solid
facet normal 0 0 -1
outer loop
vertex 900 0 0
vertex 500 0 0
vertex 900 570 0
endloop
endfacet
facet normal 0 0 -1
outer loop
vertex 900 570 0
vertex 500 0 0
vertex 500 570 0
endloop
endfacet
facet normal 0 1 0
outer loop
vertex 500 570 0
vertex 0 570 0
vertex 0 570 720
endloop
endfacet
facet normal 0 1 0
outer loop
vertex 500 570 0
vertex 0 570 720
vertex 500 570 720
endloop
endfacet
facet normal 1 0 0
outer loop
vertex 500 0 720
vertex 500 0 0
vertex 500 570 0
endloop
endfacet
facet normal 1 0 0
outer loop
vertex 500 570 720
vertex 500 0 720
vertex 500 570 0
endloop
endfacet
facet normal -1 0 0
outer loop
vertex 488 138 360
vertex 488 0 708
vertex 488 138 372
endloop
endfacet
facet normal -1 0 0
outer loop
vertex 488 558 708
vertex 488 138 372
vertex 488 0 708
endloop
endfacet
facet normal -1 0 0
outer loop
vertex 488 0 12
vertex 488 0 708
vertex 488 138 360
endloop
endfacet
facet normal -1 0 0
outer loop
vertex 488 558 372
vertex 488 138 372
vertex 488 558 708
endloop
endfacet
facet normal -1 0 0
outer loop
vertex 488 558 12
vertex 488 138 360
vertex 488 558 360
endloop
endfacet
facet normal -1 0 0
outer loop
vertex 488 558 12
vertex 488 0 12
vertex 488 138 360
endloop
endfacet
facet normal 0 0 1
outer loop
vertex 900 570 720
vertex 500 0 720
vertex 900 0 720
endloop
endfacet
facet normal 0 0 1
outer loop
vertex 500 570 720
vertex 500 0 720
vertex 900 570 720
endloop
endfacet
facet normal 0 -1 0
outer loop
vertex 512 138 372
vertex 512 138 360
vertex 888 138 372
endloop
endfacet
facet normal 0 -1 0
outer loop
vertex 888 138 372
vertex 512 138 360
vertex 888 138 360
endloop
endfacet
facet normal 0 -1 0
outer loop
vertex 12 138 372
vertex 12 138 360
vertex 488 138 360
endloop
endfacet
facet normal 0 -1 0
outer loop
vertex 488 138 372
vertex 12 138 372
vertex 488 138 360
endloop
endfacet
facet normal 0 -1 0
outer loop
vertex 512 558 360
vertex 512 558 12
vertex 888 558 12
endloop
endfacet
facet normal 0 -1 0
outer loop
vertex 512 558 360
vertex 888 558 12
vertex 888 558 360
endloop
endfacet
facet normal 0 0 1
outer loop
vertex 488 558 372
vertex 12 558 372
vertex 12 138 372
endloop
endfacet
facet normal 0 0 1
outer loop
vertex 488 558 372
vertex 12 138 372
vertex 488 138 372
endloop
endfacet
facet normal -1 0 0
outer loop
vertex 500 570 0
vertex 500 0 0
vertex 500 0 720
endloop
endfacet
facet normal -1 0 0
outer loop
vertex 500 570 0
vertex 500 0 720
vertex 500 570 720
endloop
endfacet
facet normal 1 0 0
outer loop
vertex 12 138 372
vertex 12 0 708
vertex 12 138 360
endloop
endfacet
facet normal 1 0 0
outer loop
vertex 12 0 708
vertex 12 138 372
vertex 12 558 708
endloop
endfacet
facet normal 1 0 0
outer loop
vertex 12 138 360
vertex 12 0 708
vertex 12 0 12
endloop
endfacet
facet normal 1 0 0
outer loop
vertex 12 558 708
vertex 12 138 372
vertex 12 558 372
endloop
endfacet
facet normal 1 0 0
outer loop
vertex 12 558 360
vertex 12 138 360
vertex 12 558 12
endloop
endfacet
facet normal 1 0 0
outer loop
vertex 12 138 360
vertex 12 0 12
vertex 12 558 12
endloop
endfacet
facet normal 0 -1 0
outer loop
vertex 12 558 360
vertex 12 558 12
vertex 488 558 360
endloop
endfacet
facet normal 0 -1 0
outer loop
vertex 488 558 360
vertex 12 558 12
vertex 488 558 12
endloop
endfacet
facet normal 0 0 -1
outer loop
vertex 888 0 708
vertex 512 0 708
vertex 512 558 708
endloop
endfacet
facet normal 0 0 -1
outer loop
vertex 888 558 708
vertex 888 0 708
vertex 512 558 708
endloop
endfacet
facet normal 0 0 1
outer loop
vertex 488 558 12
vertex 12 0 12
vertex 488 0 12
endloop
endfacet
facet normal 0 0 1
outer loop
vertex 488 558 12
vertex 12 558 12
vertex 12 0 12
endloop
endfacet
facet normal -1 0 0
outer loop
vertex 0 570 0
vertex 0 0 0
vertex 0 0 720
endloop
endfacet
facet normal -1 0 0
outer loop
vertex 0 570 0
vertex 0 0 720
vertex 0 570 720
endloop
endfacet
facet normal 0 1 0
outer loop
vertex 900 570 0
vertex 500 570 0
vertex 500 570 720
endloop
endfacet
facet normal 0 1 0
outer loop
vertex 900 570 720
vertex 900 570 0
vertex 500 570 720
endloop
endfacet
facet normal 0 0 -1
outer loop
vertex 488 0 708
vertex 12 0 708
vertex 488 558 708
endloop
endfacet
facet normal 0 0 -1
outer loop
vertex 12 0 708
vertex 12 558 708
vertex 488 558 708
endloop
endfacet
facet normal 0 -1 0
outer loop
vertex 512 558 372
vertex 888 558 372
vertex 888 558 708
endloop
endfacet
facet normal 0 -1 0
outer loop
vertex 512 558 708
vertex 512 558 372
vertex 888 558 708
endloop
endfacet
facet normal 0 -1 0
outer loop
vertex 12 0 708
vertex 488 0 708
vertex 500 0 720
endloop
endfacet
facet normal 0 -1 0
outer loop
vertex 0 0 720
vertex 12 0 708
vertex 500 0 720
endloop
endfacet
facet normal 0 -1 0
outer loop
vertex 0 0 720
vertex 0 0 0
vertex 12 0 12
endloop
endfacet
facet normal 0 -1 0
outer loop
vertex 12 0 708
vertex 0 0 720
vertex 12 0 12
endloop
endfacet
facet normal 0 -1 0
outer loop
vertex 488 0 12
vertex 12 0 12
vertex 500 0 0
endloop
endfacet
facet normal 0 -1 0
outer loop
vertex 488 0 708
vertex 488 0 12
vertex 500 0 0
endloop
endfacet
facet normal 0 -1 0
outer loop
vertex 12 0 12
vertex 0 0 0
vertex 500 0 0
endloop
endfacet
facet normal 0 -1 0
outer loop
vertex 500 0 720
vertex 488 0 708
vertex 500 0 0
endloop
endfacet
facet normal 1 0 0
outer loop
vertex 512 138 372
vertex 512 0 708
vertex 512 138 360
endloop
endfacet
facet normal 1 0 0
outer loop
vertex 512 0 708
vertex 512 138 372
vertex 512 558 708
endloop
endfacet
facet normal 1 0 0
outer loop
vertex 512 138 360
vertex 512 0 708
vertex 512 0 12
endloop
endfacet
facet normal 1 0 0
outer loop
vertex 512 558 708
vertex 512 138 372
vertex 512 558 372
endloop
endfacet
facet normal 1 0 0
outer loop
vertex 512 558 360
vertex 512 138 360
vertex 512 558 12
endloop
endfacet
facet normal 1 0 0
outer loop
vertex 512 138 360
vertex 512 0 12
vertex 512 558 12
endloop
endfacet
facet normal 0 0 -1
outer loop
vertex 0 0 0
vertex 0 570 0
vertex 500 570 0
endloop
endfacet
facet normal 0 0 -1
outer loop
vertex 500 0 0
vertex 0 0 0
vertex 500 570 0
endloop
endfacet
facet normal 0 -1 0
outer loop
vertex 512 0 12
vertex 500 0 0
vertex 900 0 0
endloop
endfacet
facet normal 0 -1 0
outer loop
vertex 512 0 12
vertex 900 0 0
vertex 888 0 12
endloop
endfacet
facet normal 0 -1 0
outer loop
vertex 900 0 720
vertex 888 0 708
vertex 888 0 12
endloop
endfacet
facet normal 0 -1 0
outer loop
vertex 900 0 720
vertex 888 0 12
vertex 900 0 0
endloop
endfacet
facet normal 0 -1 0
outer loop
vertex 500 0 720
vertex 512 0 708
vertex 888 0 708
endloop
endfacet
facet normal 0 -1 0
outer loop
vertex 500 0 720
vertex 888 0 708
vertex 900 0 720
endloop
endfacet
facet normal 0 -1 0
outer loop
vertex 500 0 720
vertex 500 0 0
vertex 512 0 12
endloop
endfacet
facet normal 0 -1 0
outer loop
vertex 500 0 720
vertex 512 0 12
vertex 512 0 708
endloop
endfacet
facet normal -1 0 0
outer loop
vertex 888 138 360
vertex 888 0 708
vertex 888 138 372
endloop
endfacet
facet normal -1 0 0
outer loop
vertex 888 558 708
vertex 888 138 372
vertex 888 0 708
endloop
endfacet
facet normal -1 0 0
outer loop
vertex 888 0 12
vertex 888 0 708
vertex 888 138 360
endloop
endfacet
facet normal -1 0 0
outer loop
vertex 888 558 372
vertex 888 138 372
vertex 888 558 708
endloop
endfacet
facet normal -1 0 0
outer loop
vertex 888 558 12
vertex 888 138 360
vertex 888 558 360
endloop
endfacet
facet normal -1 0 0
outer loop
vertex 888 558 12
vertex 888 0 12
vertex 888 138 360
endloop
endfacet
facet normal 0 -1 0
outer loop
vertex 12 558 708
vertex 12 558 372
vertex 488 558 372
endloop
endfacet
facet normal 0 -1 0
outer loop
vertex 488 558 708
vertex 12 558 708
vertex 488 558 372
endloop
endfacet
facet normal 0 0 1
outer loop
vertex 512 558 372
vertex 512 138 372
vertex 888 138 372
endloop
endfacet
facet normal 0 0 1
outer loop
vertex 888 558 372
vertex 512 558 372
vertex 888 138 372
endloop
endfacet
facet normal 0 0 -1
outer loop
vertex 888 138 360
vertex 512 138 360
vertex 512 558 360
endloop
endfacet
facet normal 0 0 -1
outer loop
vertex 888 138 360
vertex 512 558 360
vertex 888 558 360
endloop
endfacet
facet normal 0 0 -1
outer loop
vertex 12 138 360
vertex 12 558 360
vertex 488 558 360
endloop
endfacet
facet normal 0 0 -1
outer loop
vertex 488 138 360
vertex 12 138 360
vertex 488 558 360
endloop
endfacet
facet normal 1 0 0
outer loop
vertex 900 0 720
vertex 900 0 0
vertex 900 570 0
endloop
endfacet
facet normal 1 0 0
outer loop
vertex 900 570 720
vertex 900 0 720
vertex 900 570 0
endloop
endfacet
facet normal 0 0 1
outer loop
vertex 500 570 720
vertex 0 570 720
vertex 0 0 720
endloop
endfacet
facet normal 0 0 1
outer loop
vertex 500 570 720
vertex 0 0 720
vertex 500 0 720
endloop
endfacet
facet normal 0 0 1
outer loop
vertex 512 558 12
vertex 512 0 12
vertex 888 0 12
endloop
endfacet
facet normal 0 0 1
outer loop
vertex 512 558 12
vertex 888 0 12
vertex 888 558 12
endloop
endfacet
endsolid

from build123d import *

# Parameters (mm, degrees)
F0_W     = 500
F0_H     = 570
F1_DEPTH = 720
F2_T     = -12
F4_W     = 476
F4_H     = 420
F5_DEPTH = 12
F6_DEPTH = 400
F7_T     = -12
F8_W     = 376
F8_H     = 420
F9_DEPTH = 12


with BuildPart() as f1:
    # F0 (on Top) → F1 (new body)
    with BuildSketch(Plane.XY):
        with Locations((250, 285)):
            Rectangle(F0_W, F0_H)
    extrude(amount=F1_DEPTH)

    # F2
    f2_openings = [f1.faces().sort_by_distance(p)[0] for p in [
        (250, 0, 360),
    ]]
    offset(amount=F2_T, openings=f2_openings)

    # F4 (on offset) → F5 (join)
    with BuildSketch(Plane.XY.offset(360)):
        with Locations((250, 348)):
            Rectangle(F4_W, F4_H)
    extrude(amount=F5_DEPTH)


with BuildPart() as f6:
    # F6 (new): a face of the model
    f6_faces = [f1.part.faces().sort_by_distance(p)[0] for p in [
        (500, 285, 360),
    ]]
    extrude(f6_faces, amount=F6_DEPTH)

    # F7
    f7_openings = [f6.faces().sort_by_distance(p)[0] for p in [
        (700, 0, 360),
    ]]
    offset(amount=F7_T, openings=f7_openings)

    # F8 (on offset) → F9 (join, through all)
    with BuildSketch(Plane.XY.offset(360)):
        with Locations((700, 348)):
            Rectangle(F8_W, F8_H)
    extrude(amount=F9_DEPTH)


solid = Compound([f1.part, f6.part])
